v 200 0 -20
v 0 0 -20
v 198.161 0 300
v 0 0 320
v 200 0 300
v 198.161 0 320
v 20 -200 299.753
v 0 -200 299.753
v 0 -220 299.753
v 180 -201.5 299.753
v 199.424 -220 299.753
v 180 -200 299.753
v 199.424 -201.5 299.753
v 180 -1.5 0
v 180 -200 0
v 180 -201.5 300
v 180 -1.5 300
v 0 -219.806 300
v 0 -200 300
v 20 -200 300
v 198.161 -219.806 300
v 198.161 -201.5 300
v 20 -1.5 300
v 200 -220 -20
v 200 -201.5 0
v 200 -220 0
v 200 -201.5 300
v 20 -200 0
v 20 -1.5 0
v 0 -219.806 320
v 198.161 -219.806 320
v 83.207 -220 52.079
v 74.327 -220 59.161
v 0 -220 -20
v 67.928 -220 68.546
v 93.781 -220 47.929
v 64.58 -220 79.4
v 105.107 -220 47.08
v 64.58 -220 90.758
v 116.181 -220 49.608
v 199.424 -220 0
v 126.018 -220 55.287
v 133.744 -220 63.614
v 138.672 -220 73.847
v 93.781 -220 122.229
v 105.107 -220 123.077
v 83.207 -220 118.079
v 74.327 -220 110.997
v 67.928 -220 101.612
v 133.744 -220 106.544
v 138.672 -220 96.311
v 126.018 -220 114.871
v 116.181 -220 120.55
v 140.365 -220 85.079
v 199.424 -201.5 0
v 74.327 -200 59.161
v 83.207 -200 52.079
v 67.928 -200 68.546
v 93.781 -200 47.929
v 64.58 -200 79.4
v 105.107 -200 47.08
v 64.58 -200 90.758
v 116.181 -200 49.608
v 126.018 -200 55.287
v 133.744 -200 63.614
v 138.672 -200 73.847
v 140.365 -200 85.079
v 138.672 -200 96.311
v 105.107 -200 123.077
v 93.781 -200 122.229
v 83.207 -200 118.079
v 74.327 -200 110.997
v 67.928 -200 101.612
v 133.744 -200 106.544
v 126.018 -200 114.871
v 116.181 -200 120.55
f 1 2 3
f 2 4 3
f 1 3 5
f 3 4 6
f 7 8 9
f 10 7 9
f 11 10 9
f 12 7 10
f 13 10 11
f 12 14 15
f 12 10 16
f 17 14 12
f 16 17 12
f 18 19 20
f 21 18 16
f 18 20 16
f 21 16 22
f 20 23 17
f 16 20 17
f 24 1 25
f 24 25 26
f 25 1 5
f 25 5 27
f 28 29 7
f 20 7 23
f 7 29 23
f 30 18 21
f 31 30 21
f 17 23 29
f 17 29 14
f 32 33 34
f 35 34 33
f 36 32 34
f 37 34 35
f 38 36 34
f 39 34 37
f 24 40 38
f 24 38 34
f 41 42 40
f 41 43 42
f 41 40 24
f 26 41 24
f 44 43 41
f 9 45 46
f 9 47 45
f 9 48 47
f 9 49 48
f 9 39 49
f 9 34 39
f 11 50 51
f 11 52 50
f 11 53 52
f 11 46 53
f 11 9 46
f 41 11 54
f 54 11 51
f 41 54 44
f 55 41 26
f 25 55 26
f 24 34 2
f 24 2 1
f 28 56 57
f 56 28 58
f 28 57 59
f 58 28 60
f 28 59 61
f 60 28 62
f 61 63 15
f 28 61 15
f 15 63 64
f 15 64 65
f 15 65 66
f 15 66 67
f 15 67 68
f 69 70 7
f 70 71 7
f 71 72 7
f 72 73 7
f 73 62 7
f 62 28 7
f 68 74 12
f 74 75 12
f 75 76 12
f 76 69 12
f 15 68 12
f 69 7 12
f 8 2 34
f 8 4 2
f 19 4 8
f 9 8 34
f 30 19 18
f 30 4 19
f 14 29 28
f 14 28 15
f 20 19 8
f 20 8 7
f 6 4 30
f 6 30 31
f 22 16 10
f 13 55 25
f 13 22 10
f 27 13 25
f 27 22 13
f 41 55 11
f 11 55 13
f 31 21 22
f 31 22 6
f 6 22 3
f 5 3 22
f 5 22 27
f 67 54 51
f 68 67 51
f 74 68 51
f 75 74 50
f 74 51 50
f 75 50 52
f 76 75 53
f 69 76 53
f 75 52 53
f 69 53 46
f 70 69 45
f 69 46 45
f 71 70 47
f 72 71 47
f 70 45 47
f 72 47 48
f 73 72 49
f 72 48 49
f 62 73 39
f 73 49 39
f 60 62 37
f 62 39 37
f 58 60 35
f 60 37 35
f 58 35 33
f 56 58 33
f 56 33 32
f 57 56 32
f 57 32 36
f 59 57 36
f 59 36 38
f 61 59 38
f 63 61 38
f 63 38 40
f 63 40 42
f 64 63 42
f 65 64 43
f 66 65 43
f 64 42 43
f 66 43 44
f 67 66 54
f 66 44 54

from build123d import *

# Parameters (mm, degrees)
F0_W      = 200
F0_H      = 300
F1_DEPTH  = 1.5
F2_W      = 20
F2_H      = 300
F3_DEPTH  = 200
F4_W      = 20
F4_H      = 300
F5_DEPTH  = 200
F6_W      = 199.424341321
F6_H      = 299.7533082962
F7_DEPTH  = 20
F9_W      = 198.1611847878
F9_H      = 219.8059260845
F10_DEPTH = 20
F11_W     = 200
F11_H     = 220
F12_DEPTH = 20
F13_R     = 38.1050822629
F14_DEPTH = 20


with BuildPart() as f1:
    # F0 (on Front) → F1 (new body)
    with BuildSketch(Plane.XZ):
        with Locations((100, 150)):
            Rectangle(F0_W, F0_H)
    extrude(amount=F1_DEPTH)

    # F2 (on Front) → F3 (join)
    with BuildSketch(Plane.XZ):
        with Locations((10, 150)):
            Rectangle(F2_W, F2_H)
    extrude(amount=F3_DEPTH)

    # F4 (on face) → F5 (join)
    with BuildSketch(Plane.XZ.offset(1.5)):
        with Locations((190, 150)):
            Rectangle(F4_W, F4_H)
    extrude(amount=F5_DEPTH)

    # F6 (on face) → F7 (join)
    with BuildSketch(Plane.XZ.offset(200)):
        with Locations((99.7121706605, 149.8766541481)):
            Rectangle(F6_W, F6_H)
    extrude(amount=F7_DEPTH)

    # F9 (on face) → F10 (join)
    with BuildSketch(Plane.XY.offset(300)):
        with Locations((99.0805923939, -109.9029630423)):
            Rectangle(F9_W, F9_H)
    extrude(amount=F10_DEPTH)

    # F11 (on face) → F12 (join)
    with BuildSketch(Plane(origin=(0, 0, 0), x_dir=(1, 0, 0), z_dir=(0, 0, -1))):
        with Locations((100, 110)):
            Rectangle(F11_W, F11_H)
    extrude(amount=F12_DEPTH)

    # F13 (on face) → F14 (cut)
    with BuildSketch(Plane.XZ.offset(220)):
        with Locations((102.2598743439, 85.0789397955)):
            Circle(F13_R)
    extrude(amount=-F14_DEPTH, mode=Mode.SUBTRACT)


solid = f1.part
